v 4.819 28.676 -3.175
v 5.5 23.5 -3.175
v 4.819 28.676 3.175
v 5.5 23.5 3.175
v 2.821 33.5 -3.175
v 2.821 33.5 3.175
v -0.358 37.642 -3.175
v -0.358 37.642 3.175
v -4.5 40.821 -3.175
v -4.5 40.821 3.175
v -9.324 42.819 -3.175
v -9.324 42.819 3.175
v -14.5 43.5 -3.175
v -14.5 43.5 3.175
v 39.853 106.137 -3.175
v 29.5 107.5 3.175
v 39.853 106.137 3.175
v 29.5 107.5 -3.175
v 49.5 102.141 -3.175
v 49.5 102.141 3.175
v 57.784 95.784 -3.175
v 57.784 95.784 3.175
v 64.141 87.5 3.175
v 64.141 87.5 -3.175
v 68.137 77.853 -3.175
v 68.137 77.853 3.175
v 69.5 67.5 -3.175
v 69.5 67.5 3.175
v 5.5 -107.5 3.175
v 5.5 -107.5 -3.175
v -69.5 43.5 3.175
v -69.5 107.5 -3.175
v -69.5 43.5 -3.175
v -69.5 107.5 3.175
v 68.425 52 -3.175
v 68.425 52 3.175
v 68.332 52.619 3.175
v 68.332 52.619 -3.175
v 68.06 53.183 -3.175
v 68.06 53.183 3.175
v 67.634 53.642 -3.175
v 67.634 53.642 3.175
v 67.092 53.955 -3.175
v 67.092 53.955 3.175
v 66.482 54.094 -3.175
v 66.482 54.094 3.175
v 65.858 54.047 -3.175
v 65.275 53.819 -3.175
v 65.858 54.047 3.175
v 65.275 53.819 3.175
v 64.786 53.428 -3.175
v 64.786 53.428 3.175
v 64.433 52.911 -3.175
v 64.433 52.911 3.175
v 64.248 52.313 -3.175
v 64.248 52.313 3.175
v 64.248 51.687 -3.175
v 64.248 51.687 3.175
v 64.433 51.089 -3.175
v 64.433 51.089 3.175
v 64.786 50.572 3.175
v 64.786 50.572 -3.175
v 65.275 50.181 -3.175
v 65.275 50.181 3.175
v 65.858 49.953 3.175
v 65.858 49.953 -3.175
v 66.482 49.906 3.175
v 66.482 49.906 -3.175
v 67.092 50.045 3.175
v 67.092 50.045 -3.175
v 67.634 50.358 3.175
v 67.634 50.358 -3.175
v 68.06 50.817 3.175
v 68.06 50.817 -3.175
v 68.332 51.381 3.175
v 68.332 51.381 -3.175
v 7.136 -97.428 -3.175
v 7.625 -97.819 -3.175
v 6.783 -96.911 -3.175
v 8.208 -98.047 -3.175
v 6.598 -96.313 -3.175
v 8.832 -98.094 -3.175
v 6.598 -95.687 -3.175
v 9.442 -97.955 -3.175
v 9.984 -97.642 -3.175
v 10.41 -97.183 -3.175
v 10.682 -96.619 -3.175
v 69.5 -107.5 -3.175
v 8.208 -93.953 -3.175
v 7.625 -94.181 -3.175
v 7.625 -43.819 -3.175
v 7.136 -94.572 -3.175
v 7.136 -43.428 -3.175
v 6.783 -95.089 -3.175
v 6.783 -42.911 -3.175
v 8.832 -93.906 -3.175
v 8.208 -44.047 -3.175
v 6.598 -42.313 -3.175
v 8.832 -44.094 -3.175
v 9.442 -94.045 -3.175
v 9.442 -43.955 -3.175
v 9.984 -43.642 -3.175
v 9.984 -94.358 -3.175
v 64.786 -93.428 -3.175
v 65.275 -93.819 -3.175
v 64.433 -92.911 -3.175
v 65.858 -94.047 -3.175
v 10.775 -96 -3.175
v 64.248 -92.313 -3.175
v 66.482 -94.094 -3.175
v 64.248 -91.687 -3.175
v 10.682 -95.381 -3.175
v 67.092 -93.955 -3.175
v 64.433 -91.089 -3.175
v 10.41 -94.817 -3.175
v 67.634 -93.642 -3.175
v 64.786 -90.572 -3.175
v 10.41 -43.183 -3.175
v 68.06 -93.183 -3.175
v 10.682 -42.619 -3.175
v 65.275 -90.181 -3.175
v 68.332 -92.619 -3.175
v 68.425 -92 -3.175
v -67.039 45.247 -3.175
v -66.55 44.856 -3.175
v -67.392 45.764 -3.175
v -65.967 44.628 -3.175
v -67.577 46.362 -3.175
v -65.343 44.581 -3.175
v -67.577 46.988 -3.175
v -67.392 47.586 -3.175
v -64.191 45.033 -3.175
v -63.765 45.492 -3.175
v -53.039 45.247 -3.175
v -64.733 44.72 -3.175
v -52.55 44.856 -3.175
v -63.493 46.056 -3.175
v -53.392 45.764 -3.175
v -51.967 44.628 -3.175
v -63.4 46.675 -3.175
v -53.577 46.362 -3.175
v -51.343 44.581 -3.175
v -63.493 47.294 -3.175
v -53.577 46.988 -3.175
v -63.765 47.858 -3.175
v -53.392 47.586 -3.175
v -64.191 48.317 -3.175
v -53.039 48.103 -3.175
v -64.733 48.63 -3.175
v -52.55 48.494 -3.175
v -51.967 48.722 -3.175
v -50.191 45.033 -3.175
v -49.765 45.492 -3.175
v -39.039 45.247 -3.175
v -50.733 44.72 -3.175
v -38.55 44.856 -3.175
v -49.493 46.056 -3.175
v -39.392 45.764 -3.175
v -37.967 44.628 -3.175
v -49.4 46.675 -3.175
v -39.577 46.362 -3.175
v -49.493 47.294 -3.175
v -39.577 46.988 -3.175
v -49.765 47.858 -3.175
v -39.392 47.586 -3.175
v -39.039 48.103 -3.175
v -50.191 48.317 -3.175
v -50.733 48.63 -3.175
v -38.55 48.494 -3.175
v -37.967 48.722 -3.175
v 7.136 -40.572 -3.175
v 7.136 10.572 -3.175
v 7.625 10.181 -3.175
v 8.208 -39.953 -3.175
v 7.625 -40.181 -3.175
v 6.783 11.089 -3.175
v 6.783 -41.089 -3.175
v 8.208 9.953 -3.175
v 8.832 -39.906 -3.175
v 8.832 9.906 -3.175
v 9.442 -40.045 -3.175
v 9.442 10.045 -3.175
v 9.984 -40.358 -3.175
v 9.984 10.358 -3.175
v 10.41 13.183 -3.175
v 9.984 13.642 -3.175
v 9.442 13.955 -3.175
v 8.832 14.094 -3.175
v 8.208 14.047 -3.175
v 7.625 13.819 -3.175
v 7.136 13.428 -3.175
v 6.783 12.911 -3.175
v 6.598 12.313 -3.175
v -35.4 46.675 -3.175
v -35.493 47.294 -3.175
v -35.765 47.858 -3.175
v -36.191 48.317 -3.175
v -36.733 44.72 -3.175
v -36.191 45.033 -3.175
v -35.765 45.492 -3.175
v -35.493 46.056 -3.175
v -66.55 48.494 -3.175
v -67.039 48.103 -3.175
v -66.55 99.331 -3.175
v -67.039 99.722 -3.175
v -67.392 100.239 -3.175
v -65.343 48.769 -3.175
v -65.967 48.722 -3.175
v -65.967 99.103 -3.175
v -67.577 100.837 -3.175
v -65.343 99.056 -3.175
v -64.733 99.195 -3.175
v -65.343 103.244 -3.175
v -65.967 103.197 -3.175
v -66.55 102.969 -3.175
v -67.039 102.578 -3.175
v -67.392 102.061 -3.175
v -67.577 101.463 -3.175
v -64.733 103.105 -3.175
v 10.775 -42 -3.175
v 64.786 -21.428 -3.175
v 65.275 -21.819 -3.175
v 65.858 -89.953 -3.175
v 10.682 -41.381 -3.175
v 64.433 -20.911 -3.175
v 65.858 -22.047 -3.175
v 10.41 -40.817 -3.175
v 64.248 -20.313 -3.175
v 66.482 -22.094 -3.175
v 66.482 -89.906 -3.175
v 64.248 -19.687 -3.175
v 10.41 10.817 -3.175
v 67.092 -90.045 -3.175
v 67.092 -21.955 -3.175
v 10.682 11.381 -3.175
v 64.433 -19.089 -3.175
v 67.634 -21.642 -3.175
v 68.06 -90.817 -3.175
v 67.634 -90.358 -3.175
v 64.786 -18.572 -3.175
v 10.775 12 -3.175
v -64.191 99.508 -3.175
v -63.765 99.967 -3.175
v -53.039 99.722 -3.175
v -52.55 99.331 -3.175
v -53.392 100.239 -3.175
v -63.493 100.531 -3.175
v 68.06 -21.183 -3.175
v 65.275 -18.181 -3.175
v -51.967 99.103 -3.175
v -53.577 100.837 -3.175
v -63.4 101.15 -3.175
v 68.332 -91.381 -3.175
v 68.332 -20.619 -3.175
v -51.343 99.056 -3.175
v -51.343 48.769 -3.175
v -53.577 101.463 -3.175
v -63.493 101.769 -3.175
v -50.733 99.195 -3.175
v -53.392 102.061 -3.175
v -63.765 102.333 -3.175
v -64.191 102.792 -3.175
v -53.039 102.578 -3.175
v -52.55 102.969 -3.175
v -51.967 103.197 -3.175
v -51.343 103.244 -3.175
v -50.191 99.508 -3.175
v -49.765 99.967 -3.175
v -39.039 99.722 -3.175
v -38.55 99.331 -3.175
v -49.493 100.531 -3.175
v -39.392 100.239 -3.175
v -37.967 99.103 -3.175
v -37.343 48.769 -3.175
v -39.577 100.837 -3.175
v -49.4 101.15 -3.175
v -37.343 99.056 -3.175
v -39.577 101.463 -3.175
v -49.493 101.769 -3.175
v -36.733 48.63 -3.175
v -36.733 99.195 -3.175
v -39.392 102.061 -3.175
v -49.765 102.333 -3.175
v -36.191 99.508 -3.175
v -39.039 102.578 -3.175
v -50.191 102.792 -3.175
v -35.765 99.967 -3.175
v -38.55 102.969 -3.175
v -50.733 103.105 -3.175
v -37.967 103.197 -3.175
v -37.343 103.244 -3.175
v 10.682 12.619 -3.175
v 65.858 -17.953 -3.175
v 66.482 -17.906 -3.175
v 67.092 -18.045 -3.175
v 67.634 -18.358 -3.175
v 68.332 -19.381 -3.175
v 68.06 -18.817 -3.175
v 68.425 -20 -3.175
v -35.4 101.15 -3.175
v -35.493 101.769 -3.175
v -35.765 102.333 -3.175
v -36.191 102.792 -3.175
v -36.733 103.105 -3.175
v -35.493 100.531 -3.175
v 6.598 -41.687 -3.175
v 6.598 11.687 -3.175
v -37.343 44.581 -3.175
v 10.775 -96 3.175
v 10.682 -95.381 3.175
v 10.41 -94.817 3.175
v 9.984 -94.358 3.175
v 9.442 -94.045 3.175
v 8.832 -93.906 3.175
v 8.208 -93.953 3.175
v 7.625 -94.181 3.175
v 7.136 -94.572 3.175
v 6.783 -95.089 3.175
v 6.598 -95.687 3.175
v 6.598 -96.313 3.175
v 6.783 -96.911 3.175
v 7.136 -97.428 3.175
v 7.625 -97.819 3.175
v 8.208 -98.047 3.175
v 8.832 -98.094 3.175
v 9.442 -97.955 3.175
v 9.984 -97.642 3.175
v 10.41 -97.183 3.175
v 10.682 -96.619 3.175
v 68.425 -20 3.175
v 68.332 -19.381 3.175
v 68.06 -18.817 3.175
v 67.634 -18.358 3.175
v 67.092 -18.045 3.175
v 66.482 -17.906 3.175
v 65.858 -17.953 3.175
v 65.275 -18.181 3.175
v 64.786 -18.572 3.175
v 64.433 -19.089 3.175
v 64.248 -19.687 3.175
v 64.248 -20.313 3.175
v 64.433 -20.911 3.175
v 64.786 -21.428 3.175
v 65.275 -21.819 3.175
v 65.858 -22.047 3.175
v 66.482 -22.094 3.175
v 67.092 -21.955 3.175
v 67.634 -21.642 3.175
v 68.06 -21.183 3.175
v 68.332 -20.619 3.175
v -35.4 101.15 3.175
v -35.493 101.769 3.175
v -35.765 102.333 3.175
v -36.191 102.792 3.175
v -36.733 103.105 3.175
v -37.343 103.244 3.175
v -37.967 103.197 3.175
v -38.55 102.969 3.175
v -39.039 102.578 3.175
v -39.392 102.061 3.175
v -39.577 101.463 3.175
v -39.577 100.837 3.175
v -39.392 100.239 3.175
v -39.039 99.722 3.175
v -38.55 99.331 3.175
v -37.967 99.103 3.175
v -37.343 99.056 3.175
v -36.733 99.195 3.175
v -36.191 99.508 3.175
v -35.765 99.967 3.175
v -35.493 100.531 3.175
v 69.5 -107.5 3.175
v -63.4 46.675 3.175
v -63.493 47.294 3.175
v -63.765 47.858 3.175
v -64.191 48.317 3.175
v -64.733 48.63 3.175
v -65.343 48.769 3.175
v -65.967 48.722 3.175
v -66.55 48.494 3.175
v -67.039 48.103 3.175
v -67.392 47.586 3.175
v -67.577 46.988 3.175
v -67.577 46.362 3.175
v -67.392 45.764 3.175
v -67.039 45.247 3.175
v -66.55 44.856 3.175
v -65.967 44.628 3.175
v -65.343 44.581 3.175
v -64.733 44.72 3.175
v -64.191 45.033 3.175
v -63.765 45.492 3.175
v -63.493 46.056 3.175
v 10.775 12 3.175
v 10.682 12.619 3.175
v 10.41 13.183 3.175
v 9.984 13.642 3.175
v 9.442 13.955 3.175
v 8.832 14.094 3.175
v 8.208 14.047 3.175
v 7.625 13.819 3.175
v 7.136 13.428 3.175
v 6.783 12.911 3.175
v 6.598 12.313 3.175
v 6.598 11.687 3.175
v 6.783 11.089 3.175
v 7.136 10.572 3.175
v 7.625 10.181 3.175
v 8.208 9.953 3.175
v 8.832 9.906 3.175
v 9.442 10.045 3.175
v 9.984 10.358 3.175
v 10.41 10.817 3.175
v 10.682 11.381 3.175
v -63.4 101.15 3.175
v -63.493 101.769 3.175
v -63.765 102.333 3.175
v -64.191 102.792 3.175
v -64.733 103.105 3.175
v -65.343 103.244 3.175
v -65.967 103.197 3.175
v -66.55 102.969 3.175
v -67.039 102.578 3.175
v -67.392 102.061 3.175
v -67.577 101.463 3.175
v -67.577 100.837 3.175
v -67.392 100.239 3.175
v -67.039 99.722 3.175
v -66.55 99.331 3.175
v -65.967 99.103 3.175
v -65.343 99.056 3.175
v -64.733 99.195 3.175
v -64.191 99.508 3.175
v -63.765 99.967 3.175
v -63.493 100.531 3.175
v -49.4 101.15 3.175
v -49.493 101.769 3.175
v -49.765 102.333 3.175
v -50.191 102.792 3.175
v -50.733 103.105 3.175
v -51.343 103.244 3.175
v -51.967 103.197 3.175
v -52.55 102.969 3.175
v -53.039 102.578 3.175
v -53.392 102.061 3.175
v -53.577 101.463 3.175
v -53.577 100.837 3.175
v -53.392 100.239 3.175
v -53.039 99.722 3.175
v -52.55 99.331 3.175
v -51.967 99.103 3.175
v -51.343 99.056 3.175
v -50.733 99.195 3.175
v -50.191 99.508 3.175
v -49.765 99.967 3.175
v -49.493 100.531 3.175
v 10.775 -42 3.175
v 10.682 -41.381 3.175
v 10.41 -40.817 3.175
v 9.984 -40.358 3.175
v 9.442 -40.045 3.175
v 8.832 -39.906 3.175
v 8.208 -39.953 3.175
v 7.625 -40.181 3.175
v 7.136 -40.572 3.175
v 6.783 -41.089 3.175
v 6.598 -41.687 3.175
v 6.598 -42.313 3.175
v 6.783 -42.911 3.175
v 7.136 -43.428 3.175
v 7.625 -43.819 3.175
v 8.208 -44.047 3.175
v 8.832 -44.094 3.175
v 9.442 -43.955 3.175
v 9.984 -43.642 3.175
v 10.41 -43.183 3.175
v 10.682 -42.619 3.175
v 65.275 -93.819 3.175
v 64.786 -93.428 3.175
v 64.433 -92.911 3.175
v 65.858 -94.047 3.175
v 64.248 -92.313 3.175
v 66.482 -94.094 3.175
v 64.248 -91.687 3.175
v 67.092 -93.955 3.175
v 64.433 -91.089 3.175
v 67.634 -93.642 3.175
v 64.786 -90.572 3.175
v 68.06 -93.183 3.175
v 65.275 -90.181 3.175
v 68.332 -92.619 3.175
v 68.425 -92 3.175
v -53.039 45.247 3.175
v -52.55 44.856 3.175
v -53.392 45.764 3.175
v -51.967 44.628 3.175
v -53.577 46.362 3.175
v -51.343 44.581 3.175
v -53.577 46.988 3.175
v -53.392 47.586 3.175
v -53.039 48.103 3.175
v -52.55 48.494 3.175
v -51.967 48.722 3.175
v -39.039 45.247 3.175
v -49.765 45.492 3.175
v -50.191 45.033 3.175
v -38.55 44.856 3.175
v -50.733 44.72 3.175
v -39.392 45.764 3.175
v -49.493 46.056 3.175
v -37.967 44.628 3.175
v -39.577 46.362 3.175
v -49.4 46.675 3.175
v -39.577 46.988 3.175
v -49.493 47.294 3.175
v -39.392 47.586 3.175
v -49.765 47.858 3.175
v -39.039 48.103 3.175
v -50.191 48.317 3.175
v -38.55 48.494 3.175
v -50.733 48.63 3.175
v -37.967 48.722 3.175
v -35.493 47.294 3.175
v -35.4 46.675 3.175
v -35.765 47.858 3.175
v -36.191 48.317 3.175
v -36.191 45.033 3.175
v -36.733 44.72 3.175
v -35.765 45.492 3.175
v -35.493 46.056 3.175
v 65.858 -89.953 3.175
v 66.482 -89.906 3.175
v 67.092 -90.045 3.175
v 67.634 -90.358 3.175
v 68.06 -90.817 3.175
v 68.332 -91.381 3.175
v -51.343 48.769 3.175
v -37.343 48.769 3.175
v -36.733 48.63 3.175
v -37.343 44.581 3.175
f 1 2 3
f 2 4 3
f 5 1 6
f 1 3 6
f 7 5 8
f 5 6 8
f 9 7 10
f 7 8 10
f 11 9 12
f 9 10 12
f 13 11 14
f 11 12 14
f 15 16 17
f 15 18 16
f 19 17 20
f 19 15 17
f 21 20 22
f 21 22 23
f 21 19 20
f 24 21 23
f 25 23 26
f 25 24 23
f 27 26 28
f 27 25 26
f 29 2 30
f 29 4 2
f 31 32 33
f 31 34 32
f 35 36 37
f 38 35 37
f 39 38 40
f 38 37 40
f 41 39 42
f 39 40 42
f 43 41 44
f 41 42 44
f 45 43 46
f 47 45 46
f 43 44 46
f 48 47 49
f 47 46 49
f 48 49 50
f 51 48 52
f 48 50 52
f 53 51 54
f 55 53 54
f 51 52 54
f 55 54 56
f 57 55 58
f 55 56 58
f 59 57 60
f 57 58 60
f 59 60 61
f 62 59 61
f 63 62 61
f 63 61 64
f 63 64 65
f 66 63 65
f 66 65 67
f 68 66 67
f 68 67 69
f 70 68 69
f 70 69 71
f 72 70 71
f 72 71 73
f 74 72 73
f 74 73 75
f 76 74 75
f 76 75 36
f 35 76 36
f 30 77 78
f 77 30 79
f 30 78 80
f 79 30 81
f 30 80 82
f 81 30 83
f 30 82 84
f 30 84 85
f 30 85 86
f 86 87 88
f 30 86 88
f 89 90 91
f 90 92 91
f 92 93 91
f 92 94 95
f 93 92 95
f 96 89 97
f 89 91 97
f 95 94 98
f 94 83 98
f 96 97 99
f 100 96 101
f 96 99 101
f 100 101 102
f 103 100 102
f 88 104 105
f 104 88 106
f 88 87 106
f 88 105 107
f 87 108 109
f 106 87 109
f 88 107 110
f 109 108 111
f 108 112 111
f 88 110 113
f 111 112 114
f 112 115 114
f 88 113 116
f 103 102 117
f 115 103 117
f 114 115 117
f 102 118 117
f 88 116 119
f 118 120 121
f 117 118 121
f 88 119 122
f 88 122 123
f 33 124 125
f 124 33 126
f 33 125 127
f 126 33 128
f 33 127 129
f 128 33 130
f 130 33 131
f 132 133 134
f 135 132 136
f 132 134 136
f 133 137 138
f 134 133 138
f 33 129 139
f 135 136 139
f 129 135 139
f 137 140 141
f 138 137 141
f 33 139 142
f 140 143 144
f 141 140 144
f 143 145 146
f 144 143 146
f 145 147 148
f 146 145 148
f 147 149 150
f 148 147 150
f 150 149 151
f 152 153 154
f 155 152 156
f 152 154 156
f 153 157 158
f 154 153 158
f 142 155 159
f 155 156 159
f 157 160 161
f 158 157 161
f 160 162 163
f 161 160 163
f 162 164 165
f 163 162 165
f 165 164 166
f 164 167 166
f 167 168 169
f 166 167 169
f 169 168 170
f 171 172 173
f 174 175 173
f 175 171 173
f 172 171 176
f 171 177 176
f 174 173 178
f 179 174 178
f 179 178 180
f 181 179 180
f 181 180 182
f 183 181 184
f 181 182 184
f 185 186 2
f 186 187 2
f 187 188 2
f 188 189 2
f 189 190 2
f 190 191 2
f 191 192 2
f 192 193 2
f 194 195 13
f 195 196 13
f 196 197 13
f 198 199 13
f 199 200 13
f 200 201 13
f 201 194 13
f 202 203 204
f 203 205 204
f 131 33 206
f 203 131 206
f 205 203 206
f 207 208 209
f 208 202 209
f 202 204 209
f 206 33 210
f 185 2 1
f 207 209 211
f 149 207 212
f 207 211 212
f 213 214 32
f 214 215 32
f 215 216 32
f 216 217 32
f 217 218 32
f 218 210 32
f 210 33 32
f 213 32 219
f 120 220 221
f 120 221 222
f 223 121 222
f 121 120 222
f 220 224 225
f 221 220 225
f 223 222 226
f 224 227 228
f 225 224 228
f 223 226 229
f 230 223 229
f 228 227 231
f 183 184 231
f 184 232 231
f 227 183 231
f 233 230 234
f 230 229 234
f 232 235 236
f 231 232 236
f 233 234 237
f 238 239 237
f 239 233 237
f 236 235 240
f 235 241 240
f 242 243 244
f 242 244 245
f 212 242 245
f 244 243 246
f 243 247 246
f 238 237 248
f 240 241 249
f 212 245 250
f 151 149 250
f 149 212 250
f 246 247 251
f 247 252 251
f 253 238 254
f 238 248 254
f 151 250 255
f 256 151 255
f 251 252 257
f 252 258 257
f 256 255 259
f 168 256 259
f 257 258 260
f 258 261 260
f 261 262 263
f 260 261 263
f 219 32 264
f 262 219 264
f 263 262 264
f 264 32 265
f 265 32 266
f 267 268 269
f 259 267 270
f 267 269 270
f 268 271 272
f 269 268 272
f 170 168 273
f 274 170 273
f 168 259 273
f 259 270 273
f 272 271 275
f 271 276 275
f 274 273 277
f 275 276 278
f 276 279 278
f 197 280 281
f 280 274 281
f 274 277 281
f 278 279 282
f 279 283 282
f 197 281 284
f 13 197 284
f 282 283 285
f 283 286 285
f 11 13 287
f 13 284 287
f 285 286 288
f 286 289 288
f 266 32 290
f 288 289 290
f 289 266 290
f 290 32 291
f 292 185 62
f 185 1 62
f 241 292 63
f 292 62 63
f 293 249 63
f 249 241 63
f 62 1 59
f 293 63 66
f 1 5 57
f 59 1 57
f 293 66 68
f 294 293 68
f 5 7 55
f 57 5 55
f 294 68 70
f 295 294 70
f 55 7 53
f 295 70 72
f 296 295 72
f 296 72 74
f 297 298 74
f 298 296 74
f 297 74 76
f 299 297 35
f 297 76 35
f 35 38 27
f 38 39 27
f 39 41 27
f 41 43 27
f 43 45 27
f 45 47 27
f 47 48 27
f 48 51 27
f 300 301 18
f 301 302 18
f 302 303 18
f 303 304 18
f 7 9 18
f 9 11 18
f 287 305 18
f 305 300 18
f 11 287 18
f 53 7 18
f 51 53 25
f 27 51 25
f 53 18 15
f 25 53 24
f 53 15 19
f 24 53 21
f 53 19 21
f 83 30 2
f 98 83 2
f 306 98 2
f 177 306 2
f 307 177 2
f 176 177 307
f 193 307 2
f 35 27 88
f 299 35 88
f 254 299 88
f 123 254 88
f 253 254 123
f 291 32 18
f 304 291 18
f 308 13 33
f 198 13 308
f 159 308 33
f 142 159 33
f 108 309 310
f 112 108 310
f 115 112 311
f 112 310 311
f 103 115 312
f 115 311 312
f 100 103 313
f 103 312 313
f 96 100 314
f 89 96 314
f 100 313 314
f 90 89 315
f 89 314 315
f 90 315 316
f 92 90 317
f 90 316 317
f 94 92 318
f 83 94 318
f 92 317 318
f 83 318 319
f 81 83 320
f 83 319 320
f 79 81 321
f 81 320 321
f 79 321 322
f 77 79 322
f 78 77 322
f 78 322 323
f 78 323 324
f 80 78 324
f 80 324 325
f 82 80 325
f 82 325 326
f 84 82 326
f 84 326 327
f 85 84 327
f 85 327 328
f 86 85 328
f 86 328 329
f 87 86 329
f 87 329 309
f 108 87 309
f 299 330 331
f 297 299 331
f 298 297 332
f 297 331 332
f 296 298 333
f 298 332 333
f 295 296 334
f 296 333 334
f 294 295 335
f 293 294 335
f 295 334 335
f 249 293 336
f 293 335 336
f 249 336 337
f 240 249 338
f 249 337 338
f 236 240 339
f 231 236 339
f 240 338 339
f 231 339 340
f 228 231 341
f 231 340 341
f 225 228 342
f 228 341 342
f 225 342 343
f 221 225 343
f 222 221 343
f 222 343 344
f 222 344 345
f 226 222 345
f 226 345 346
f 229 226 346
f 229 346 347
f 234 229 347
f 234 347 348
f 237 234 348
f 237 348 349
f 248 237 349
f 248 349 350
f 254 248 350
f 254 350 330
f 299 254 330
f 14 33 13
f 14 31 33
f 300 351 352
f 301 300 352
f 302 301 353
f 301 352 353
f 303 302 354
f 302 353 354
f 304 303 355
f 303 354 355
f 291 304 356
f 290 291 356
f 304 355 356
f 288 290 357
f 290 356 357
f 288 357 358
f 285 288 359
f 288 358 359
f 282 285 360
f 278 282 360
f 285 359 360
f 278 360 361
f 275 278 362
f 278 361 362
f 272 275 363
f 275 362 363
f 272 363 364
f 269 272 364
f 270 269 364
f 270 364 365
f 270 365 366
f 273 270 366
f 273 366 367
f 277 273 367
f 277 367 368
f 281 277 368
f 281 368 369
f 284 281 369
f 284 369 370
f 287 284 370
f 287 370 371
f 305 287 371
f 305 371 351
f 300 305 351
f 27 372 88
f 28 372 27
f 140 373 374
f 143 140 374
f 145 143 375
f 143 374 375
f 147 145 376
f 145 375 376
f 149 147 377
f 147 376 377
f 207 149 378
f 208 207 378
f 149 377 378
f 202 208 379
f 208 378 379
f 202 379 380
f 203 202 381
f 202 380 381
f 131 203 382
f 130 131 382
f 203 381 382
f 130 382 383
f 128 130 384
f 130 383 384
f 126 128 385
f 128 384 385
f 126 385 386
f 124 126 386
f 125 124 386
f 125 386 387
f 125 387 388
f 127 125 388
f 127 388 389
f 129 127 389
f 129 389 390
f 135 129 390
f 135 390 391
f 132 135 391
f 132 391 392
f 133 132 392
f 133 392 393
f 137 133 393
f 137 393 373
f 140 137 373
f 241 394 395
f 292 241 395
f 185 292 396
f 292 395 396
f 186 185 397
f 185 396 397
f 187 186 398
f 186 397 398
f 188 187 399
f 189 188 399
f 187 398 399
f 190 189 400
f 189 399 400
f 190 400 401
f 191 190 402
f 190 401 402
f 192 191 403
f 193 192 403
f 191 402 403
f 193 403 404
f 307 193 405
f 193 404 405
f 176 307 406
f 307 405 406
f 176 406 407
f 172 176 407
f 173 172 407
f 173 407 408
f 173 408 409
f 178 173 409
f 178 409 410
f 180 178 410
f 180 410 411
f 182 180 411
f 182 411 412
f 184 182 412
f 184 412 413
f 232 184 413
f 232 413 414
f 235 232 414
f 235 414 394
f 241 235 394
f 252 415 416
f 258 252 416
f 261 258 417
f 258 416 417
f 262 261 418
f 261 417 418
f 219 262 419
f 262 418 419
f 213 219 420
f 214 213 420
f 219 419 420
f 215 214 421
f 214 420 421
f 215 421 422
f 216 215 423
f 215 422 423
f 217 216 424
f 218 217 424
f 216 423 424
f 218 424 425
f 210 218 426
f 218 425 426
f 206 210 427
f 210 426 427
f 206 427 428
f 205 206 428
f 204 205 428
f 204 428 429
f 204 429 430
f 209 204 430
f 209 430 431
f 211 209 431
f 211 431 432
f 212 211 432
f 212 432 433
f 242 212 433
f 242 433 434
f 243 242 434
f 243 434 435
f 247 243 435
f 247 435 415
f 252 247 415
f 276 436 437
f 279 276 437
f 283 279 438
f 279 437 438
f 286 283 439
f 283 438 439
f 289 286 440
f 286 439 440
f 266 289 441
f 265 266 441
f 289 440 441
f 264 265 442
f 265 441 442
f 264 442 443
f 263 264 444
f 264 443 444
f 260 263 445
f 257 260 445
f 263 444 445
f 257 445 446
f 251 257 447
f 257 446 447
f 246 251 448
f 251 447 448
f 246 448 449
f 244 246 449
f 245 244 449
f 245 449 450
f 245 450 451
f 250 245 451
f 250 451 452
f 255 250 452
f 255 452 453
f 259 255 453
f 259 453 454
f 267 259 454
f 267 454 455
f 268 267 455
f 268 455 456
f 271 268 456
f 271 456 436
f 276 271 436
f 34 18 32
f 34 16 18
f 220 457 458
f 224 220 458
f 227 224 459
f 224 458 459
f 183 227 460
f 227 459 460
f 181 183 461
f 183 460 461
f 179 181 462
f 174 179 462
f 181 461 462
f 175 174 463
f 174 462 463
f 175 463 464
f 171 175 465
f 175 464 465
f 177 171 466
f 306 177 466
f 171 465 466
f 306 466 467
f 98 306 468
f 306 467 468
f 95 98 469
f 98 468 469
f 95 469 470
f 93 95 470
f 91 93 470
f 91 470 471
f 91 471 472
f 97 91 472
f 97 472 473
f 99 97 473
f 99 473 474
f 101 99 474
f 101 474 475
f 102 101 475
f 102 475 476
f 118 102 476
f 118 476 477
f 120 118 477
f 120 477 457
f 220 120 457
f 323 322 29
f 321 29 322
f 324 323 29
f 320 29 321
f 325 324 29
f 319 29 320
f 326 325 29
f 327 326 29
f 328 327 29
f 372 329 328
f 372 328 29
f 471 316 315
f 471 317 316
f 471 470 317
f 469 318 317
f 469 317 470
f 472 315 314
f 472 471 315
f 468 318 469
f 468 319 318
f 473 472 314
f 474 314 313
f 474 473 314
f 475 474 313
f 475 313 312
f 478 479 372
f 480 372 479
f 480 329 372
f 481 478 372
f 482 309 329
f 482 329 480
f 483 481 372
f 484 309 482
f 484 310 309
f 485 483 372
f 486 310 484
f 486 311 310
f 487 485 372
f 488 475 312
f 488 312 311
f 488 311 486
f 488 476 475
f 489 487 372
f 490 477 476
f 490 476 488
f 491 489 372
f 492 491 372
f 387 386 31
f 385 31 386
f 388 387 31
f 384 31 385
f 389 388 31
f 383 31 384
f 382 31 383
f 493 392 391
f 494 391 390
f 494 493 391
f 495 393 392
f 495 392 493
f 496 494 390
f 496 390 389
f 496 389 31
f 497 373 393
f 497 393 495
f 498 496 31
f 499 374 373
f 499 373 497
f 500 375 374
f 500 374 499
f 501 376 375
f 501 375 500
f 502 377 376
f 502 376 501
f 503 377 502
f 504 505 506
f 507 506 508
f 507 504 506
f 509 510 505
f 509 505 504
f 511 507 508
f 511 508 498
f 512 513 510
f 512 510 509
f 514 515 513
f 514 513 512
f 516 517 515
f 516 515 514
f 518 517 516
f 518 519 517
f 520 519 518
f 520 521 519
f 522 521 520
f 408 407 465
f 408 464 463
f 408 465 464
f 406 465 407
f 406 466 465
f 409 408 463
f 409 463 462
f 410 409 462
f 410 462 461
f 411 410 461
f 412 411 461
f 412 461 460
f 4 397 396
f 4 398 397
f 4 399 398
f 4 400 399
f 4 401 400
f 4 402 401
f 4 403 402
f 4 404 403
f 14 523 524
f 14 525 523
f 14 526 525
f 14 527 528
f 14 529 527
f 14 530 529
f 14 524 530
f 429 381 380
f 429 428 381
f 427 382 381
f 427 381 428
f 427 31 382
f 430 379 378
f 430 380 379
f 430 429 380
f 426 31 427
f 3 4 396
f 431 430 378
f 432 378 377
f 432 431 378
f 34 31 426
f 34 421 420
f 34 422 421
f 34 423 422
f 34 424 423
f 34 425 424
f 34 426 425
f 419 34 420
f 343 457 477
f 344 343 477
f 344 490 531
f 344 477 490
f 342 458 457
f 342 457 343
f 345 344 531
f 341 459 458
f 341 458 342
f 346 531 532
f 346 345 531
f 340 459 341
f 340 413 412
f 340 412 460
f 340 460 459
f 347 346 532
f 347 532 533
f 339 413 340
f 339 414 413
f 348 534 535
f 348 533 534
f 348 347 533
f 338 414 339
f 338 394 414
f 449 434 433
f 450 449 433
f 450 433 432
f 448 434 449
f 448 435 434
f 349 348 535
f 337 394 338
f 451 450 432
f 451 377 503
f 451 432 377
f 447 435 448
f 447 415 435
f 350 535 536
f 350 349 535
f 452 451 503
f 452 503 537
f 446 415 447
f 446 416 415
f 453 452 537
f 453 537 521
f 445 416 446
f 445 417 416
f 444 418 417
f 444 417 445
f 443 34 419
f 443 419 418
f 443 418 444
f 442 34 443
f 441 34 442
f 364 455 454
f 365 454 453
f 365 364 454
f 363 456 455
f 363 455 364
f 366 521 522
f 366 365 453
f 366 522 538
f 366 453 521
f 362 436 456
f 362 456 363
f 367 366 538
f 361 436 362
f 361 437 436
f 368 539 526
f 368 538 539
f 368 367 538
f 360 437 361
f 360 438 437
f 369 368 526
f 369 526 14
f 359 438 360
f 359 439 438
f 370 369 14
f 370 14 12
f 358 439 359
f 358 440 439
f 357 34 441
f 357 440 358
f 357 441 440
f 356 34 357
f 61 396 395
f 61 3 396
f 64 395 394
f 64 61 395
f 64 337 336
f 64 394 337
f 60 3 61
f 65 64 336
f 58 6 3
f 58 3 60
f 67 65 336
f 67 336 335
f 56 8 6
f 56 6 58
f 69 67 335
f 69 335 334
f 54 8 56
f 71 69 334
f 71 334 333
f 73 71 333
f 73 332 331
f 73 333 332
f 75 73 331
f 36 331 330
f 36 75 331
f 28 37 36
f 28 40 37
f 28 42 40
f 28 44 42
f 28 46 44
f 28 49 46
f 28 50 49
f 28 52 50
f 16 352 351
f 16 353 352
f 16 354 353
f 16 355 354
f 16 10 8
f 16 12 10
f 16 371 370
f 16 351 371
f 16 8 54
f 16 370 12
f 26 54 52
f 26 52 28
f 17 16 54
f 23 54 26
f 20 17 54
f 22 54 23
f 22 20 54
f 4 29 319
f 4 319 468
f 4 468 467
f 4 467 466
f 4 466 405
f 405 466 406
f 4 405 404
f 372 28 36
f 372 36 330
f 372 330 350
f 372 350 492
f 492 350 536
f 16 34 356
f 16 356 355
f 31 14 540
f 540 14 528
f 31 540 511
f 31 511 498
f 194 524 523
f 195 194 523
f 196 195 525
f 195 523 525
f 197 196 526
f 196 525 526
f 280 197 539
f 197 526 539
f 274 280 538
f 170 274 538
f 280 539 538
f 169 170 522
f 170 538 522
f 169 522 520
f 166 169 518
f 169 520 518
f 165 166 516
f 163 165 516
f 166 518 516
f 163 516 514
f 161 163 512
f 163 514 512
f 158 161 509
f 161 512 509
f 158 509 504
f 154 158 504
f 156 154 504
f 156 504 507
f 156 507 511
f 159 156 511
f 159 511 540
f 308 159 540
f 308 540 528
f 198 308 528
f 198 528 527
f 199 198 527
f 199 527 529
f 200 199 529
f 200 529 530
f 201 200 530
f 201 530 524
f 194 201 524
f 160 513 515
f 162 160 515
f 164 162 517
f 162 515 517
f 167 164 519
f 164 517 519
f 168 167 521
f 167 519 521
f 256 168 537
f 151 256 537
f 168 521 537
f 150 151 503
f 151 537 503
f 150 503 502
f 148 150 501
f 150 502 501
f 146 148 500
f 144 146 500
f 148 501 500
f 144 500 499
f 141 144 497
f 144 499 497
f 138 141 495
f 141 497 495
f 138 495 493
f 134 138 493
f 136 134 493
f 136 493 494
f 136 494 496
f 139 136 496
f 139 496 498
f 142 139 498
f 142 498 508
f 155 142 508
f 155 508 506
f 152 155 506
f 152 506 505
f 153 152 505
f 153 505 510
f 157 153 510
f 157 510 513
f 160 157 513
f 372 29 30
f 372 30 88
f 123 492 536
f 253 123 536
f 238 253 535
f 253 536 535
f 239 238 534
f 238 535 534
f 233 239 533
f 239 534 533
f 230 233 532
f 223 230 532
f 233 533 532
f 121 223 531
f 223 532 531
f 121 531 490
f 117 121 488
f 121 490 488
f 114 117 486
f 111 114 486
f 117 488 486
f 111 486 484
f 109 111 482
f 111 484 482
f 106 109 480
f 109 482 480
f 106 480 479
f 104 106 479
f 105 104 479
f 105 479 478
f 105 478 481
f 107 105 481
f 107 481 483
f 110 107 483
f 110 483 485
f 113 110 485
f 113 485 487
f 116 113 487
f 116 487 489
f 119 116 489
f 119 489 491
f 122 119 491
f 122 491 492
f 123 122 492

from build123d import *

# Parameters (mm, degrees)
BOSS_EXTRUDE1_DEPTH = 3.175
FILLET2_R           = 40
FILLET3_R           = 20
SKETCH2_R           = 2.1
CUT_EXTRUDE1_DEPTH  = 129.167166232
SKETCH3_R           = 2.1
CUT_EXTRUDE2_DEPTH  = 129.167166232
SKETCH4_R           = 2.1
CUT_EXTRUDE3_DEPTH  = 129.167166232


with BuildPart() as part:
    # Sketch1 → Boss-Extrude1 (new, symmetric)
    with BuildSketch(Plane.XY):
        Polygon((-69.5, 107.5), (-69.5, 43.5), (5.5, 43.5), (5.5, -107.5), (69.5, -107.5), (69.5, 107.5), align=None)
    extrude(amount=BOSS_EXTRUDE1_DEPTH, both=True)

    # Fillet2
    fillet2_edges = [part.edges().sort_by_distance(p)[0] for p in [
        (69.5, 107.5, 0),
    ]]
    fillet(fillet2_edges, radius=FILLET2_R)

    # Fillet3
    fillet3_edges = [part.edges().sort_by_distance(p)[0] for p in [
        (5.5, 43.5, 0),
    ]]
    fillet(fillet3_edges, radius=FILLET3_R)

    # Sketch2 → Cut-Extrude1 (cut, through all)
    with BuildSketch(Plane.XY.offset(3.175)):
        with Locations((-37.5, 101.15)):
            Circle(SKETCH2_R)
        with Locations((-51.5, 101.15)):
            Circle(SKETCH2_R)
        with Locations((-65.5, 101.15)):
            Circle(SKETCH2_R)
        with Locations((-65.5, 46.675)):
            Circle(SKETCH2_R)
        with Locations((-37.5, 46.675)):
            Circle(SKETCH2_R)
        with Locations((-51.5, 46.675)):
            Circle(SKETCH2_R)
    extrude(amount=-CUT_EXTRUDE1_DEPTH, mode=Mode.SUBTRACT)

    # Sketch3 → Cut-Extrude2 (cut, through all)
    with BuildSketch(Plane.XY.offset(3.175)):
        with Locations((66.325, -92)):
            Circle(SKETCH3_R)
        with Locations((66.325, 52)):
            Circle(SKETCH3_R)
        with Locations((66.325, -20)):
            Circle(SKETCH3_R)
    extrude(amount=-CUT_EXTRUDE2_DEPTH, mode=Mode.SUBTRACT)

    # Sketch4 → Cut-Extrude3 (cut, through all)
    with BuildSketch(Plane.XY.offset(3.175)):
        with Locations((8.675, -96)):
            Circle(SKETCH4_R)
        with Locations((8.675, -42)):
            Circle(SKETCH4_R)
        with Locations((8.675, 12)):
            Circle(SKETCH4_R)
    extrude(amount=-CUT_EXTRUDE3_DEPTH, mode=Mode.SUBTRACT)


solid = part.part
